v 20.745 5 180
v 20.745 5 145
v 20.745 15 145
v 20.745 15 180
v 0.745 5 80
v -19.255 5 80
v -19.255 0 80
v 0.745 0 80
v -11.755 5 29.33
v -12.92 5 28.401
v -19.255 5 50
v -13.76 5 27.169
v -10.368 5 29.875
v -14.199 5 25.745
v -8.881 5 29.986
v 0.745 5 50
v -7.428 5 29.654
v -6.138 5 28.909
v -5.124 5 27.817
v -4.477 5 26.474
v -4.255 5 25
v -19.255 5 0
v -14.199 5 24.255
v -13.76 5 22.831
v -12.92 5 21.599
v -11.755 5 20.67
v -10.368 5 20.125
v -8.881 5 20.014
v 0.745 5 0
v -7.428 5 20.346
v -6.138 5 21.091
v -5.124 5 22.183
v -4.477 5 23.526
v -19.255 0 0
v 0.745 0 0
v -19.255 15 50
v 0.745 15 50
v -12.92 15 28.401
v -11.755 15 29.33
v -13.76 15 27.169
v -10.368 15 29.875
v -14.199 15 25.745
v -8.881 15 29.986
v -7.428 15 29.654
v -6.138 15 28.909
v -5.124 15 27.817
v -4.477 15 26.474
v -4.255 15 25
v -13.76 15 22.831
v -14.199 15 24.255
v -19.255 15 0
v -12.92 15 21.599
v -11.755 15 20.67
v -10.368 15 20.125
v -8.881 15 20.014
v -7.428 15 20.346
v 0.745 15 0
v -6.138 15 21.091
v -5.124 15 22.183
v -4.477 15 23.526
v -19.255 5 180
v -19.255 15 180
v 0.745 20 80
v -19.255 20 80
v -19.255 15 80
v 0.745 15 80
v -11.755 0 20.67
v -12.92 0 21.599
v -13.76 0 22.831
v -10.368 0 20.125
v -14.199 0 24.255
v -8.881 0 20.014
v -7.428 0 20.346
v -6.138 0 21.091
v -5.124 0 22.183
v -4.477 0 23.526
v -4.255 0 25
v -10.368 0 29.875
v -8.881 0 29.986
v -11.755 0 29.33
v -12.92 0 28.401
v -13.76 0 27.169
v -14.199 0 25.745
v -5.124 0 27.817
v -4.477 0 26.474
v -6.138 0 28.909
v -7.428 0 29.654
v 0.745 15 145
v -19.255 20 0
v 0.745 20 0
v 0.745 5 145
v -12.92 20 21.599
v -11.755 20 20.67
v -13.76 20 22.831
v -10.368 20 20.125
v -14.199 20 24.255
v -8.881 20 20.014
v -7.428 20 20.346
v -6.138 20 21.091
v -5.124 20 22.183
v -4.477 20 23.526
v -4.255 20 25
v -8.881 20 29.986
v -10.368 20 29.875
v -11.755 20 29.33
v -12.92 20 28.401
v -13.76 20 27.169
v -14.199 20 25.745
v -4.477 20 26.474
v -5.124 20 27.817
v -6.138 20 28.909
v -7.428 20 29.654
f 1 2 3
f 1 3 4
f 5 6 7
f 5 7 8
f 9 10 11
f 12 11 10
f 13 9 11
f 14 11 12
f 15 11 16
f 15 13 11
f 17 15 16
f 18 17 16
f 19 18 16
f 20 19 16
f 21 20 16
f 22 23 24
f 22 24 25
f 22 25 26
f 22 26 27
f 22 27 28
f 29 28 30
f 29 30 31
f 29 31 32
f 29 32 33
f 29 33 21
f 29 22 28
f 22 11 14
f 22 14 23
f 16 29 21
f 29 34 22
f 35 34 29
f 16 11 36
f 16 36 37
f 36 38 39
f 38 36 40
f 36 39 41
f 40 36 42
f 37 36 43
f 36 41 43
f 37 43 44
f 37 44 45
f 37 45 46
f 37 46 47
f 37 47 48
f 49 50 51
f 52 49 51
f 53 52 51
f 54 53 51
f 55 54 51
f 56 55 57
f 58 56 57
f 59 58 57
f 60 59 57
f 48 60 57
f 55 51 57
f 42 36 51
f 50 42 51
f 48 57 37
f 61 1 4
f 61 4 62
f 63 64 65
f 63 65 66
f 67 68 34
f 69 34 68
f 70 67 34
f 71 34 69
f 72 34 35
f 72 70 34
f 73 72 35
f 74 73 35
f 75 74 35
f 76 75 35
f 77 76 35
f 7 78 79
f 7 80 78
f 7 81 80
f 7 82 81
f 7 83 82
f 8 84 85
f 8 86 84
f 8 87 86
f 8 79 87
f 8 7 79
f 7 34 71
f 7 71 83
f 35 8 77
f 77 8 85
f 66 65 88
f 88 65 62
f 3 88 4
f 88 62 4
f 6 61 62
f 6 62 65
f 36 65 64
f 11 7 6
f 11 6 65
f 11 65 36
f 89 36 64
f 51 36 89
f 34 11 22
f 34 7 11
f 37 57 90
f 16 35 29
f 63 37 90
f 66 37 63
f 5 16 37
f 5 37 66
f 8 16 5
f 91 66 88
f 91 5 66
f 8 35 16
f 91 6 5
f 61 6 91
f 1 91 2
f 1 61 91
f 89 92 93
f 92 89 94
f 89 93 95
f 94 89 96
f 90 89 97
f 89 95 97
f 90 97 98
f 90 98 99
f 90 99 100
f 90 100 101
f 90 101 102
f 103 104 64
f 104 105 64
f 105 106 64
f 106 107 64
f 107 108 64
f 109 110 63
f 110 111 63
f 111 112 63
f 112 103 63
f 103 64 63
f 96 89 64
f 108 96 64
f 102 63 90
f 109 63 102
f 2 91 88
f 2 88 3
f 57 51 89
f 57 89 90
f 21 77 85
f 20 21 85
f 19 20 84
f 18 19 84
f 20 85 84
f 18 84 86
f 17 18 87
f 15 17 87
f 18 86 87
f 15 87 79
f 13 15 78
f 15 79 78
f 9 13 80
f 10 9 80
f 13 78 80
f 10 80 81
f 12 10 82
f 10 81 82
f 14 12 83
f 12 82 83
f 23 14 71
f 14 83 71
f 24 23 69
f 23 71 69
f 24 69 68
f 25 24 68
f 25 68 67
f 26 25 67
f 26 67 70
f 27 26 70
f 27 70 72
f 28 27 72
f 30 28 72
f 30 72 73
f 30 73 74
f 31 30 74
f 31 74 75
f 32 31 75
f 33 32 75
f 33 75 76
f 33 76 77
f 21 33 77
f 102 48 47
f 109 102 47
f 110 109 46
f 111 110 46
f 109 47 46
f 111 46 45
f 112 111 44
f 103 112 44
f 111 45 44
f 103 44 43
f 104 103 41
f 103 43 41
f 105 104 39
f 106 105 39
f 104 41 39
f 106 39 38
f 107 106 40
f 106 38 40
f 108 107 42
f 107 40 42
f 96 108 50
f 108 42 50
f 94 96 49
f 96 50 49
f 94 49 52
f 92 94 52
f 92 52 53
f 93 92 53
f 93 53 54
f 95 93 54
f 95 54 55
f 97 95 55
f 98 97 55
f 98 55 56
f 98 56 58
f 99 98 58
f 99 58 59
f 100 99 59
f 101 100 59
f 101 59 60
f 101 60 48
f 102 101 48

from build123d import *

# Parameters (mm, degrees)
F1_DEPTH = 20
F2_W     = 40
F2_H     = 5
F3_DEPTH = 100
F4_W     = 20
F4_H     = 10
F5_DEPTH = 50
F6_R     = 5
F7_DEPTH = 20.001


with BuildPart() as f1:
    # F0 (on Front) → F1 (new body)
    with BuildSketch(Plane.XZ):
        Polygon((-19.255103, 180), (-19.255103, 0), (0.744897, 0), (0.744897, 145), (20.744897, 145), (20.744897, 180), align=None)
    extrude(amount=-F1_DEPTH)

    # F2 (on face) → F3 (cut)
    with BuildSketch(Plane.XY.offset(180)):
        with Locations((0.744897, 17.5)):
            Rectangle(F2_W, F2_H)
        with Locations((0.744897, 2.5)):
            Rectangle(F2_W, F2_H)
    extrude(amount=-F3_DEPTH, mode=Mode.SUBTRACT)

    # F4 (on face) → F5 (cut)
    with BuildSketch(Plane(origin=(0, 0, 0), x_dir=(1, 0, 0), z_dir=(0, 0, -1))):
        with Locations((-9.255103, -10)):
            Rectangle(F4_W, F4_H)
    extrude(amount=-F5_DEPTH, mode=Mode.SUBTRACT)

    # F6 (on face) → F7 (cut, through all)
    with BuildSketch(Plane.XZ):
        with Locations((-9.255103, 25)):
            Circle(F6_R)
    extrude(amount=-F7_DEPTH, mode=Mode.SUBTRACT)


solid = f1.part
